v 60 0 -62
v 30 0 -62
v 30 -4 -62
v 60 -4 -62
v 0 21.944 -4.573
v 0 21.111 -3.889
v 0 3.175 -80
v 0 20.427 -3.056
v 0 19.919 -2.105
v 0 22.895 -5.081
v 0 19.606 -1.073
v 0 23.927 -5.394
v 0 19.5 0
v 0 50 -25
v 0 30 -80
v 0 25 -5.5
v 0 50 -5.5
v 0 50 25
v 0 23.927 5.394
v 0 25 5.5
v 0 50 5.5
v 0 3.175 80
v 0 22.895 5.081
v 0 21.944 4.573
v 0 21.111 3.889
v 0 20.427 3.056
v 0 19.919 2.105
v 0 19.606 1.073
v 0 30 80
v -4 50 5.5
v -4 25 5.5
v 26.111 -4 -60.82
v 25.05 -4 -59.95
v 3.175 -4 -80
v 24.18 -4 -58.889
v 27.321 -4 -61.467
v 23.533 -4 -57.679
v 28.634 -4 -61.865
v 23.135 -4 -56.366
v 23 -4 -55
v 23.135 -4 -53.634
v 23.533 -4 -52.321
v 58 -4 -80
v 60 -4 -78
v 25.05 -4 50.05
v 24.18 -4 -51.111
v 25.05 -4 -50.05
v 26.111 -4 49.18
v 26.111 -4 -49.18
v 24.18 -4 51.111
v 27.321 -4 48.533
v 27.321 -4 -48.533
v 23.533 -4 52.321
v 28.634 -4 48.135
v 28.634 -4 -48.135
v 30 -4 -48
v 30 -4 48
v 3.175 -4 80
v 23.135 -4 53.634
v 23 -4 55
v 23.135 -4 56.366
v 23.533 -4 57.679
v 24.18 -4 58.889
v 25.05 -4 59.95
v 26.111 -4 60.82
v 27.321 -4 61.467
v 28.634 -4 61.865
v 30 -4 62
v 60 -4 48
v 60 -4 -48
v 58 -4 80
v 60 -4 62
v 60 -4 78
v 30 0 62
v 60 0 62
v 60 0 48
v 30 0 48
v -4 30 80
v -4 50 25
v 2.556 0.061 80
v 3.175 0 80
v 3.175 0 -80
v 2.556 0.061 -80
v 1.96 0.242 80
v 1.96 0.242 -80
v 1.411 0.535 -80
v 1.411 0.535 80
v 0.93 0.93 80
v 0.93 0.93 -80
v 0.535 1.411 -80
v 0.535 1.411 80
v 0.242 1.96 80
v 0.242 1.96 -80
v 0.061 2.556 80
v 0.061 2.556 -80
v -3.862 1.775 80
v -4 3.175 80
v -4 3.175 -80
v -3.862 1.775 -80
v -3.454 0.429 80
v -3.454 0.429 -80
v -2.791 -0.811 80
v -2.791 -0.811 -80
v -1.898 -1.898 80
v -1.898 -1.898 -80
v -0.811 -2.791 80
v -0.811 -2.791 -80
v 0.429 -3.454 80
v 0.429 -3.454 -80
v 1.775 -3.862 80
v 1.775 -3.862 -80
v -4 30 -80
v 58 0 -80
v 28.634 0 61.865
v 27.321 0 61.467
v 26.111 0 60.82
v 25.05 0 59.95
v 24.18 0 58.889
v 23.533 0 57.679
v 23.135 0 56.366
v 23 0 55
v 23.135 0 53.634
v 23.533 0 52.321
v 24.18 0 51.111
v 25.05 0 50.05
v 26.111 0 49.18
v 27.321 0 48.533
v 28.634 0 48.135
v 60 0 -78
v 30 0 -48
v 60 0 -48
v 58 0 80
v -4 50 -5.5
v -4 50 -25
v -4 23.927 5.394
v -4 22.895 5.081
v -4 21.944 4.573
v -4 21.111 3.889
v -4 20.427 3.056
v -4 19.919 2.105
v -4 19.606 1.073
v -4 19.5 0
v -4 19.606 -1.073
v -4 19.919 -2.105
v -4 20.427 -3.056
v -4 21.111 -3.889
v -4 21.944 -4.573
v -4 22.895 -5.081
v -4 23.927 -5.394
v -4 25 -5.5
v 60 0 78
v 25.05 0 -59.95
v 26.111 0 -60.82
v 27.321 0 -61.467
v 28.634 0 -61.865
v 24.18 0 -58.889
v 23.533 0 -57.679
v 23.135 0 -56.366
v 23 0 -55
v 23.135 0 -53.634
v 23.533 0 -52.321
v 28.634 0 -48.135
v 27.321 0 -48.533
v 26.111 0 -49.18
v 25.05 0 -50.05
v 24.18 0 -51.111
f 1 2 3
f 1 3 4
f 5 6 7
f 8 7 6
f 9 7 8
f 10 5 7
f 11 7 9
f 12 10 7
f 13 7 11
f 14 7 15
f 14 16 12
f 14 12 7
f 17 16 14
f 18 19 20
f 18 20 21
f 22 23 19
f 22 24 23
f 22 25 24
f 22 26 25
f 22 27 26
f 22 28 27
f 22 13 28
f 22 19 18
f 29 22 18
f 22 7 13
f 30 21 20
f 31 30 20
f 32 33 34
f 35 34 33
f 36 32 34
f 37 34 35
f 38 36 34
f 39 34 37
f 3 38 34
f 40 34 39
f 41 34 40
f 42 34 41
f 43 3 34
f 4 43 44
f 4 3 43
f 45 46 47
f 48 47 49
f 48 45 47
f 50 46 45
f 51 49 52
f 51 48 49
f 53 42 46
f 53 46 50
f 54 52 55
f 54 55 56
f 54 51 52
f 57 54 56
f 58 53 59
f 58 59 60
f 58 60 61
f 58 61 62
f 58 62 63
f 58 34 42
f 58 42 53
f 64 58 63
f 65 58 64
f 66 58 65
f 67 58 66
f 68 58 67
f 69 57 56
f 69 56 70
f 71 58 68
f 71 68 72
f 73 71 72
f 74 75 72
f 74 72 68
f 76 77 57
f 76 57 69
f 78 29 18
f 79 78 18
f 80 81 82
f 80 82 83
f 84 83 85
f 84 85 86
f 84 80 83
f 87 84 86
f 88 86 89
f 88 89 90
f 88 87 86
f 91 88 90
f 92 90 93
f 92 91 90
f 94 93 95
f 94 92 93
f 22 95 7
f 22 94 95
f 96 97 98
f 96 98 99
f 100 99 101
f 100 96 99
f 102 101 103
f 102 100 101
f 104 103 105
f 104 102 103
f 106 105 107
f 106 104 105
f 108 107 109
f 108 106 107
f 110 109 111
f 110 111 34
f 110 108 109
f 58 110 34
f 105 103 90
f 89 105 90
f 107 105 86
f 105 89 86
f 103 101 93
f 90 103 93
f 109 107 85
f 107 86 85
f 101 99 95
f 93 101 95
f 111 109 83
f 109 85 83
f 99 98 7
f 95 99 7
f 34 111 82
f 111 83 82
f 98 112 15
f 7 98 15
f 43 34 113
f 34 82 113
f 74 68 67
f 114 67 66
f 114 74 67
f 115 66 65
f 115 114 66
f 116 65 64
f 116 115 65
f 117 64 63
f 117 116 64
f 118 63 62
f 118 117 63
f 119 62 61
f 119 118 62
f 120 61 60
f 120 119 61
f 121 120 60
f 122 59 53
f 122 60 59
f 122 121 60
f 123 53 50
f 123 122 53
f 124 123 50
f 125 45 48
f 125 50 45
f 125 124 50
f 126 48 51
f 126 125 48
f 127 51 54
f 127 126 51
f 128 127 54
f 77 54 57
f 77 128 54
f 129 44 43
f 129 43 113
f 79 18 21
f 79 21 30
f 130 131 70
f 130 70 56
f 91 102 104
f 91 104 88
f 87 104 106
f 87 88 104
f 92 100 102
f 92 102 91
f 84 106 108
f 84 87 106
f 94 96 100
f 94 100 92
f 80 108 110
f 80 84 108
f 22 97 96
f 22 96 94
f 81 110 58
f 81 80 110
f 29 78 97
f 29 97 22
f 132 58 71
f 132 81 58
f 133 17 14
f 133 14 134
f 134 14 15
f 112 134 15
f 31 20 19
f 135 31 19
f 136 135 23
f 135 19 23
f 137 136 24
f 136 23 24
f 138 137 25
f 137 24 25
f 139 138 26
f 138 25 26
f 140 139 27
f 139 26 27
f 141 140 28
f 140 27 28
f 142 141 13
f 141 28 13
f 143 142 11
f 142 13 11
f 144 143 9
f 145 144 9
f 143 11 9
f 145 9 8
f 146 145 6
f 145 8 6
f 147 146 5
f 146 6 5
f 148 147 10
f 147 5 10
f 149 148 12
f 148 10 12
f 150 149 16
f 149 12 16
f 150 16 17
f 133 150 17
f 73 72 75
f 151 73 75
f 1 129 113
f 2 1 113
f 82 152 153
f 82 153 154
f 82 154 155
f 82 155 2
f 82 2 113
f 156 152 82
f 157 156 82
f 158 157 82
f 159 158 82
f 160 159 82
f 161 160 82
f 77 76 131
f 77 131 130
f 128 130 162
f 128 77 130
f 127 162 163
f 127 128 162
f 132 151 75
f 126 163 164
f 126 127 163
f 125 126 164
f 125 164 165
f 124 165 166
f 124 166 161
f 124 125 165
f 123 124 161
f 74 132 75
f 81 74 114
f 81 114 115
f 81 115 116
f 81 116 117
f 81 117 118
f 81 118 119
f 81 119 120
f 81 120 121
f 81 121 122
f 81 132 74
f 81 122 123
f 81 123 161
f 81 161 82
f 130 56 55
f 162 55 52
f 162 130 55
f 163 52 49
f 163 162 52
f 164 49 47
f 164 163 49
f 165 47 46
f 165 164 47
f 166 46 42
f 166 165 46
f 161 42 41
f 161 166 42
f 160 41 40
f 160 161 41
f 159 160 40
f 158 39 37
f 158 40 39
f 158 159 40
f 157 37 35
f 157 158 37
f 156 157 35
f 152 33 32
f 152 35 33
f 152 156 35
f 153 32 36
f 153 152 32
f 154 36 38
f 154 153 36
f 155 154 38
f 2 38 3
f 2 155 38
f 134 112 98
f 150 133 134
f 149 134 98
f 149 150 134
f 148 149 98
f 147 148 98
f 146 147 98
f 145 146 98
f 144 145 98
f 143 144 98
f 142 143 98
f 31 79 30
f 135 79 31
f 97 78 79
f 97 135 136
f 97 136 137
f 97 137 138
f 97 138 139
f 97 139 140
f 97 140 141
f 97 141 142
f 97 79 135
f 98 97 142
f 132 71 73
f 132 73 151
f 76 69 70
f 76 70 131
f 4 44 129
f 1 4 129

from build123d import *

# Parameters (mm, degrees)
BASE_FLANGE1_DEPTH = 80
CUT_EXTRUDE1_REACH = 113.803
CUT_EXTRUDE2_REACH = 113.803
CUT_EXTRUDE3_REACH = 113.803
CHAMFER1_SIZE      = 2


# Sheet-metal steps are written as plain solids
with BuildPart() as part:
    # Sketch1 → Base-Flange1 (new, symmetric)
    with BuildSketch(Plane.XY):
        with BuildLine():
            Line((60, 0), (3.175, 0))
            ThreePointArc((3.175, 0), (0.92993597, 0.92993597), (0, 3.175))
            Line((0, 3.175), (0, 50))
            Line((0, 50), (-4, 50))
            Line((-4, 50), (-4, 3.175))
            ThreePointArc((-4, 3.175), (-1.898491155, -1.898491155), (3.175, -4))
            Line((3.175, -4), (60, -4))
            Line((60, -4), (60, 0))
        make_face()
    extrude(amount=BASE_FLANGE1_DEPTH, both=True)

    # Sketch6 → Cut-Extrude1 (cut, up to next)
    with BuildSketch(Plane(origin=(0, 0, 0), x_dir=(0, 0, -1), z_dir=(1, 0, 0)), mode=Mode.PRIVATE) as cut_extrude1_sk1:
        with BuildLine():
            Line((5.5, 25), (5.5, 50))
            Line((5.5, 50), (-5.5, 50))
            Line((-5.5, 50), (-5.5, 25))
            ThreePointArc((-5.5, 25), (0, 19.5), (5.5, 25))
        make_face()
    cut_extrude1_tool1 = extrude(cut_extrude1_sk1.sketch, amount=-CUT_EXTRUDE1_REACH, mode=Mode.PRIVATE) & part.part
    add(cut_extrude1_tool1.solids().sort_by_distance((0, 35.314457, 0))[0], mode=Mode.SUBTRACT)

    # Sketch8 → Cut-Extrude2 (cut, up to next)
    with BuildSketch(Plane(origin=(0, 0, 0), x_dir=(0, 0, -1), z_dir=(1, 0, 0)), mode=Mode.PRIVATE) as cut_extrude2_sk1:
        Polygon((-80, 30), (-25, 50), (-80, 50), align=None)
    cut_extrude2_tool1 = extrude(cut_extrude2_sk1.sketch, amount=-CUT_EXTRUDE2_REACH, mode=Mode.PRIVATE) & part.part
    # Sketch8 → Cut-Extrude2 (cut, up to next)
    with BuildSketch(Plane(origin=(0, 0, 0), x_dir=(0, 0, -1), z_dir=(1, 0, 0)), mode=Mode.PRIVATE) as cut_extrude2_sk2:
        Polygon((25, 50), (80, 30), (80, 50), align=None)
    cut_extrude2_tool2 = extrude(cut_extrude2_sk2.sketch, amount=-CUT_EXTRUDE2_REACH, mode=Mode.PRIVATE) & part.part
    add(cut_extrude2_tool1.solids().sort_by_distance((0, 43.333333, 61.666667))[0], mode=Mode.SUBTRACT)
    add(cut_extrude2_tool2.solids().sort_by_distance((0, 43.333333, -61.666667))[0], mode=Mode.SUBTRACT)

    # Sketch9 → Cut-Extrude3 (cut, up to next)
    with BuildSketch(Plane(origin=(0, 0, 0), x_dir=(1, 0, 0), z_dir=(0, 1, 0)), mode=Mode.PRIVATE) as cut_extrude3_sk1:
        with BuildLine():
            Line((30, 62), (60, 62))
            Line((60, 62), (60, 48))
            Line((60, 48), (30, 48))
            ThreePointArc((30, 48), (23, 55), (30, 62))
        make_face()
    cut_extrude3_tool1 = extrude(cut_extrude3_sk1.sketch, amount=-CUT_EXTRUDE3_REACH, mode=Mode.PRIVATE) & part.part
    # Sketch9 → Cut-Extrude3 (cut, up to next)
    with BuildSketch(Plane(origin=(0, 0, 0), x_dir=(1, 0, 0), z_dir=(0, 1, 0)), mode=Mode.PRIVATE) as cut_extrude3_sk2:
        with BuildLine():
            Line((30, -48), (60, -48))
            Line((60, -48), (60, -62))
            Line((60, -62), (30, -62))
            ThreePointArc((30, -62), (23, -55), (30, -48))
        make_face()
    cut_extrude3_tool2 = extrude(cut_extrude3_sk2.sketch, amount=-CUT_EXTRUDE3_REACH, mode=Mode.PRIVATE) & part.part
    add(cut_extrude3_tool1.solids().sort_by_distance((42.216724, 0, -55))[0], mode=Mode.SUBTRACT)
    add(cut_extrude3_tool2.solids().sort_by_distance((42.216724, 0, 55))[0], mode=Mode.SUBTRACT)

    # Chamfer1
    chamfer1_edges = [part.edges().sort_by_distance(p)[0] for p in [
        (60, -2, 80),
        (60, -2, -80),
    ]]
    chamfer(chamfer1_edges, length=CHAMFER1_SIZE)


solid = part.part
